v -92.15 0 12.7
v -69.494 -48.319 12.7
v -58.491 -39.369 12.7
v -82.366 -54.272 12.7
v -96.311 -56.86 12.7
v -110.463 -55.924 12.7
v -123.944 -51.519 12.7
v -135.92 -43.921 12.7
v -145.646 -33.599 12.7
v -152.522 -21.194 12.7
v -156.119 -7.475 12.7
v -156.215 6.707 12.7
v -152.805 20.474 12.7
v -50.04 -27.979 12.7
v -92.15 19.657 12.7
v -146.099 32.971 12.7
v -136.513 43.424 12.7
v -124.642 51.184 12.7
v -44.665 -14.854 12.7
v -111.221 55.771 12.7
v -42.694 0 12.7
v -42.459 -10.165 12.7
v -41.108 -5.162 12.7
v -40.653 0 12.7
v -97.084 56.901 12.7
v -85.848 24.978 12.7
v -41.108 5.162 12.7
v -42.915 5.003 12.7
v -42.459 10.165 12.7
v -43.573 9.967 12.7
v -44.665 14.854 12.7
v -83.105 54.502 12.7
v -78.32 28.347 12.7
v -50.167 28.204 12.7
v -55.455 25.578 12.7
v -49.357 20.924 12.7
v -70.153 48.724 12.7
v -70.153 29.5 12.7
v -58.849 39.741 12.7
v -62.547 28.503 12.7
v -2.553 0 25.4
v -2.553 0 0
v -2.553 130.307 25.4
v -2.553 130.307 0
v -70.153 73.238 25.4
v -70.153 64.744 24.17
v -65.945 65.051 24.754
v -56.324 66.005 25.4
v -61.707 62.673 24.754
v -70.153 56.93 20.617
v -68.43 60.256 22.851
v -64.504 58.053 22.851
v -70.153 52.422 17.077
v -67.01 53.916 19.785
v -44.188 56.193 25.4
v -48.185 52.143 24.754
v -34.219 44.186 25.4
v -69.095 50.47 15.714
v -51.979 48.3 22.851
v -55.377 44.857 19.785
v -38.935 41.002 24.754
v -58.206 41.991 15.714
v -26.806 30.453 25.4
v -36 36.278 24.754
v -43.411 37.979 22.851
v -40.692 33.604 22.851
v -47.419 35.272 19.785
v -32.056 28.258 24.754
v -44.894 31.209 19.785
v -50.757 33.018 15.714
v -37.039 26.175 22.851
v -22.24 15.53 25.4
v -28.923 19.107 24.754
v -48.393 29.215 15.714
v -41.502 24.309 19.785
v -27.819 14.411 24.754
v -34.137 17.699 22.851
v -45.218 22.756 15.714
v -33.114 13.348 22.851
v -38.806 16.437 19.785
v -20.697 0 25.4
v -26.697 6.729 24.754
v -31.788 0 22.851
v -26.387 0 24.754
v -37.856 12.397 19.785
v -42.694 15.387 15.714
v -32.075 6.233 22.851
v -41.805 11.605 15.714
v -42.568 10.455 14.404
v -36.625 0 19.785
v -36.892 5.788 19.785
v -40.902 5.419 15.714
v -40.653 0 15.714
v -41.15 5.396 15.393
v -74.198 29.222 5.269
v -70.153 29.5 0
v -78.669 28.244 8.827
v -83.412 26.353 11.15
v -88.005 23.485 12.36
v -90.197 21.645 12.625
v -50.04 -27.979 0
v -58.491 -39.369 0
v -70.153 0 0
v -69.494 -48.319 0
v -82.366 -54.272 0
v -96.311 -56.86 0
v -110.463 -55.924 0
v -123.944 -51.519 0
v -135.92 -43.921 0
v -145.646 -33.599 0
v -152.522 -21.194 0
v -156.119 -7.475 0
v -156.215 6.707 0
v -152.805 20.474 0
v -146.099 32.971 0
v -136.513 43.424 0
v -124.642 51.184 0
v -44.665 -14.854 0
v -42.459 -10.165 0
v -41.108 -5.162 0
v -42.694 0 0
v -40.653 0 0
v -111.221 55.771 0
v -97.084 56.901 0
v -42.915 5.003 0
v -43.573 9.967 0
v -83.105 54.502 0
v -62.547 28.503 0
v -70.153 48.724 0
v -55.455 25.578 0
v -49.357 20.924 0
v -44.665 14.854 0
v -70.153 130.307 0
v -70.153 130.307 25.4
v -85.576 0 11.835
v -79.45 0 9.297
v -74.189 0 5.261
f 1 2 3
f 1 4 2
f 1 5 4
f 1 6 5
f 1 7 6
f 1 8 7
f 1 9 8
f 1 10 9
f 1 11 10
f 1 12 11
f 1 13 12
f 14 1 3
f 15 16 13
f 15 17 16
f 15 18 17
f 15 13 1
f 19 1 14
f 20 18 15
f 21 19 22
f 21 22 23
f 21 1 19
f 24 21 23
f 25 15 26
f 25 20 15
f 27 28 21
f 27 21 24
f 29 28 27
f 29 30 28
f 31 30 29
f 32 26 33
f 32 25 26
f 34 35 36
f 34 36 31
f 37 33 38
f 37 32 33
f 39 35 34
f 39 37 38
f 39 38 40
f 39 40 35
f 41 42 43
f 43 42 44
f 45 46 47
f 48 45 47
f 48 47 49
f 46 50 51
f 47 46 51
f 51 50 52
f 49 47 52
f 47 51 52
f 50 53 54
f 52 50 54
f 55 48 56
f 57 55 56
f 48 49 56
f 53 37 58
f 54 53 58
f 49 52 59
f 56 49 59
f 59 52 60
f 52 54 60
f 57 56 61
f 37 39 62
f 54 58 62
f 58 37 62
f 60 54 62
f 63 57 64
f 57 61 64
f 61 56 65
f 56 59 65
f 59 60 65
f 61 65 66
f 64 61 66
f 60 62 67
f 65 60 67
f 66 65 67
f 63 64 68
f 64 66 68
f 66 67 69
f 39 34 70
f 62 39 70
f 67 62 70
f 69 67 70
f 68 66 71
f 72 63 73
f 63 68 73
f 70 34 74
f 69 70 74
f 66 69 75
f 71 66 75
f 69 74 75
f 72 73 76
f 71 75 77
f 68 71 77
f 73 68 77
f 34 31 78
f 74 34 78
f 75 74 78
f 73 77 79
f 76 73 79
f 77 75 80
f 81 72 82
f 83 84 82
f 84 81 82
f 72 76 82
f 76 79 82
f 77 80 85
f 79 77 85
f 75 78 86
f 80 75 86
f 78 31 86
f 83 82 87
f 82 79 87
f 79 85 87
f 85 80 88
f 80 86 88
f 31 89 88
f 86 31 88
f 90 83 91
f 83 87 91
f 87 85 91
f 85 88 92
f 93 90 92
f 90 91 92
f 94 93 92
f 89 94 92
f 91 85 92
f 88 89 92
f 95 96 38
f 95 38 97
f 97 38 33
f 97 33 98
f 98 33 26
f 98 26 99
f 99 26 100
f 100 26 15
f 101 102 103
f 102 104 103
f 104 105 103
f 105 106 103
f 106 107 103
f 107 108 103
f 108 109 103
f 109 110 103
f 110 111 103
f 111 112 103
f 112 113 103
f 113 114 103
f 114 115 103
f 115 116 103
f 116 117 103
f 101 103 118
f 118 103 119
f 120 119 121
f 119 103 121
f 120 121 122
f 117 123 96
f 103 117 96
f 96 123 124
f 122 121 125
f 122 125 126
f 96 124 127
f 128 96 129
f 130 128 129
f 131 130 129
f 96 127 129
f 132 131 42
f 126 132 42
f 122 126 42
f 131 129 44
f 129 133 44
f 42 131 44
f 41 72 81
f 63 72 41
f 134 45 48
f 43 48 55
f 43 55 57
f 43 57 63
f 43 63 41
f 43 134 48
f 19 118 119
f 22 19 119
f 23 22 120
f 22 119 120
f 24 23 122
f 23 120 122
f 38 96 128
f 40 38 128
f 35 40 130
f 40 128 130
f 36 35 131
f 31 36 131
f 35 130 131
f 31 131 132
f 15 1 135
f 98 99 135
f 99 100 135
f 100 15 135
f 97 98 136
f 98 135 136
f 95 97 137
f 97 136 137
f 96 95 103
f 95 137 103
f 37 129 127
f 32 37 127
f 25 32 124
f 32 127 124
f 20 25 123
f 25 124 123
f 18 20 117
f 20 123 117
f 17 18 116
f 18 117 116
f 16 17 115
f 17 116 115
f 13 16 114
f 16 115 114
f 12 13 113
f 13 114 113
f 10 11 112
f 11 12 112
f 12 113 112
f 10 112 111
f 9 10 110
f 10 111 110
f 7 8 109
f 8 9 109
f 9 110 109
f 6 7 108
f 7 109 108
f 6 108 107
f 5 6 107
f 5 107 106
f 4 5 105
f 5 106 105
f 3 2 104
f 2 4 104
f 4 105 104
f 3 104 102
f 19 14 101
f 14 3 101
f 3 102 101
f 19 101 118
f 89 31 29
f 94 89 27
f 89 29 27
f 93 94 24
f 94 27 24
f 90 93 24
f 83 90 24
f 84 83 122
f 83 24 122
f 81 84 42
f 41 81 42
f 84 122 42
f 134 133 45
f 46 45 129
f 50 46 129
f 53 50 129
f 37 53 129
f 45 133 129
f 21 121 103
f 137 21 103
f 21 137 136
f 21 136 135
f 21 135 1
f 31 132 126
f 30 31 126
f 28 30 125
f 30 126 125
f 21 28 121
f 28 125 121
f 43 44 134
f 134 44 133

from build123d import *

# Parameters (mm, degrees)
F1_DEPTH     = 25.4
F2_DEPTH     = 12.7
F3_T4_DEPTH  = 139.4853841596
F3_S5_R      = 56.9586140596
F3_T6_DEPTH  = 72
F3_T11_DEPTH = 84.4927710193
F3_S12_R     = 29.500157879
F3_T13_DEPTH = 46
F3_T15_ANGLE = 154.3366921311


# Not quite as in the source:
# - a fillet or chamfer that OpenCascade refuses, or shapes differently, is made with other operations: its cross-section is extruded or revolved along the edge and cut away or added


with BuildPart() as f1:
    # F0 (on Top) → F1 (new body)
    with BuildSketch(Plane.XY):
        with BuildLine():
            ThreePointArc((-44.6654795557, 14.8543386834), (-41.6735799491, 7.6933988578), (-40.6527291, 0))
            Line((-40.6527291, 0), (-2.5527291, 0))
            Line((-2.5527291, 0), (-2.5527291, 130.3065121174))
            Line((-2.5527291, 130.3065121174), (-70.1528869789, 130.3065121174))
            Line((-70.1528869789, 130.3065121174), (-70.1528869789, 48.7239612584))
            ThreePointArc((-70.1528869789, 48.7239612584), (-54.141159867, 34.2483874097), (-44.6654795557, 14.8543386834))
        make_face()
    extrude(amount=F1_DEPTH)

    # F0 (on Top) → F2 (join)
    with BuildSketch(Plane.XY):
        with BuildLine():
            Line((-42.6944307983, 0), (-70.1528869789, 0))
            Line((-70.1528869789, 0), (-70.1528869789, 29.500157879))
            ThreePointArc((-70.1528869789, 29.500157879), (-95.730852606, -14.6978566215), (-44.6654795557, -14.8543386834))
            ThreePointArc((-44.6654795557, -14.8543386834), (-43.1893431296, -7.4922695314), (-42.6944307983, 0))
        make_face()
        with BuildLine():
            ThreePointArc((-44.6654795557, 14.8543386834), (-43.1893431296, 7.4922695314), (-42.6944307983, 0))
            Line((-42.6944307983, 0), (-40.6527291, 0))
            ThreePointArc((-40.6527291, 0), (-41.6735799491, 7.6933988578), (-44.6654795557, 14.8543386834))
        make_face()
        with BuildLine():
            Line((-40.6527291, 0), (-42.6944307983, 0))
            ThreePointArc((-42.6944307983, 0), (-43.1893431296, -7.4922695314), (-44.6654795557, -14.8543386834))
            ThreePointArc((-44.6654795557, -14.8543386834), (-41.6735799491, -7.6933988578), (-40.6527291, 0))
        make_face()
        with BuildLine():
            ThreePointArc((-44.6654795557, -14.8543386834), (-95.730852606, -14.6978566215), (-70.1528869789, 29.500157879))
            Line((-70.1528869789, 29.500157879), (-70.1528869789, 48.7239612584))
            ThreePointArc((-70.1528869789, 48.7239612584), (-152.5216924476, -21.1940986511), (-44.6654795557, -14.8543386834))
        make_face()
        with BuildLine():
            Line((-70.1528869789, 48.7239612584), (-70.1528869789, 29.500157879))
            ThreePointArc((-70.1528869789, 29.500157879), (-55.4550303574, 25.577965627), (-44.6654795557, 14.8543386834))
            ThreePointArc((-44.6654795557, 14.8543386834), (-54.141159867, 34.2483874097), (-70.1528869789, 48.7239612584))
        make_face()
        with BuildLine():
            ThreePointArc((-44.6654795557, 14.8543386834), (-41.6735799491, 7.6933988578), (-40.6527291, 0))
            Line((-40.6527291, 0), (-2.5527291, 0))
            Line((-2.5527291, 0), (-2.5527291, 130.3065121174))
            Line((-2.5527291, 130.3065121174), (-70.1528869789, 130.3065121174))
            Line((-70.1528869789, 130.3065121174), (-70.1528869789, 48.7239612584))
            ThreePointArc((-70.1528869789, 48.7239612584), (-54.141159867, 34.2483874097), (-44.6654795557, 14.8543386834))
        make_face()
    extrude(amount=F2_DEPTH)

    # F3: fillet of radius 25.4 on 2 edges, made by hand


with BuildPart() as f3_tool2:
    # F3_s3 → F3_t4 (new body)
    with BuildSketch(Plane.XZ.offset(54.9926131403)):
        with BuildLine():
            ThreePointArc((-92.1499322351, 12.7), (-79.4499322351, 9.2970452561), (-70.1528869789, 0))
            Line((-70.1528869789, 0), (-69.7129460738, 0.254))
            ThreePointArc((-69.7129460738, 0.254), (-69.6448869789, 6.35), (-69.6448869789, 12.7))
            Line((-69.6448869789, 12.7), (-70.1528869789, 13.208))
            Line((-70.1528869789, 13.208), (-92.1499322351, 13.208))
            Line((-92.1499322351, 13.208), (-92.1499322351, 12.7))
        make_face()
    extrude(amount=-F3_T4_DEPTH)

    # F3_s5 → F3_t6 (cut, symmetric)
    with BuildSketch(Plane.XY.offset(6.6)):
        with Locations((-99.6530448579, 0)):
            Circle(F3_S5_R)
    extrude(amount=F3_T6_DEPTH, both=True, mode=Mode.SUBTRACT)

    split(bisect_by=Plane.XZ, keep=Keep.TOP)


with BuildPart() as f1_1:
    add(f1.part)

    # F3_t1: cut F3_tool2
    add(f3_tool2.part, mode=Mode.SUBTRACT)


with BuildPart() as f3_tool9:
    # F3_s10 → F3_t11 (new body)
    with BuildSketch(Plane.XZ):
        with BuildLine():
            ThreePointArc((-92.1499322351, 12.7), (-79.4499322351, 9.2970452561), (-70.1528869789, 0))
            Line((-70.1528869789, 0), (-69.7129460738, 0.254))
            ThreePointArc((-69.7129460738, 0.254), (-69.6448869789, 6.35), (-69.6448869789, 12.7))
            Line((-69.6448869789, 12.7), (-70.1528869789, 13.208))
            Line((-70.1528869789, 13.208), (-92.1499322351, 13.208))
            Line((-92.1499322351, 13.208), (-92.1499322351, 12.7))
        make_face()
    extrude(amount=-F3_T11_DEPTH)

    # F3_s12 → F3_t13 (intersect, symmetric)
    with BuildSketch(Plane.XY.offset(6.6)):
        with Locations((-70.1528869789, 0)):
            Circle(F3_S12_R)
    extrude(amount=F3_T13_DEPTH, both=True, mode=Mode.INTERSECT)


with BuildPart() as f1_2:
    add(f1_1.part)

    # F3_t8: cut F3_tool9
    add(f3_tool9.part, mode=Mode.SUBTRACT)

    # F3_s14 → F3_t15 (revolve, cut)
    with BuildSketch(Plane(origin=(-82.9981282802, -37.1796571073, 0), x_dir=(0, 0, 1), z_dir=(-0.912617648, -0.4088141736, 0))):
        with BuildLine():
            ThreePointArc((25.4, 119.695236496), (21.9970452561, 106.995236496), (12.7, 97.6981912399))
            Line((12.7, 97.6981912399), (12.954, 97.2582503348))
            ThreePointArc((12.954, 97.2582503348), (19.05, 97.1901912399), (25.4, 97.1901912399))
            Line((25.4, 97.1901912399), (25.908, 97.6981912399))
            Line((25.908, 97.6981912399), (25.908, 119.695236496))
            Line((25.908, 119.695236496), (25.4, 119.695236496))
        make_face()
    revolve(axis=Axis((-99.6530448579, 0, 25.4), (0, 0, -1)), revolution_arc=F3_T15_ANGLE, mode=Mode.SUBTRACT)


solid = f1_2.part
